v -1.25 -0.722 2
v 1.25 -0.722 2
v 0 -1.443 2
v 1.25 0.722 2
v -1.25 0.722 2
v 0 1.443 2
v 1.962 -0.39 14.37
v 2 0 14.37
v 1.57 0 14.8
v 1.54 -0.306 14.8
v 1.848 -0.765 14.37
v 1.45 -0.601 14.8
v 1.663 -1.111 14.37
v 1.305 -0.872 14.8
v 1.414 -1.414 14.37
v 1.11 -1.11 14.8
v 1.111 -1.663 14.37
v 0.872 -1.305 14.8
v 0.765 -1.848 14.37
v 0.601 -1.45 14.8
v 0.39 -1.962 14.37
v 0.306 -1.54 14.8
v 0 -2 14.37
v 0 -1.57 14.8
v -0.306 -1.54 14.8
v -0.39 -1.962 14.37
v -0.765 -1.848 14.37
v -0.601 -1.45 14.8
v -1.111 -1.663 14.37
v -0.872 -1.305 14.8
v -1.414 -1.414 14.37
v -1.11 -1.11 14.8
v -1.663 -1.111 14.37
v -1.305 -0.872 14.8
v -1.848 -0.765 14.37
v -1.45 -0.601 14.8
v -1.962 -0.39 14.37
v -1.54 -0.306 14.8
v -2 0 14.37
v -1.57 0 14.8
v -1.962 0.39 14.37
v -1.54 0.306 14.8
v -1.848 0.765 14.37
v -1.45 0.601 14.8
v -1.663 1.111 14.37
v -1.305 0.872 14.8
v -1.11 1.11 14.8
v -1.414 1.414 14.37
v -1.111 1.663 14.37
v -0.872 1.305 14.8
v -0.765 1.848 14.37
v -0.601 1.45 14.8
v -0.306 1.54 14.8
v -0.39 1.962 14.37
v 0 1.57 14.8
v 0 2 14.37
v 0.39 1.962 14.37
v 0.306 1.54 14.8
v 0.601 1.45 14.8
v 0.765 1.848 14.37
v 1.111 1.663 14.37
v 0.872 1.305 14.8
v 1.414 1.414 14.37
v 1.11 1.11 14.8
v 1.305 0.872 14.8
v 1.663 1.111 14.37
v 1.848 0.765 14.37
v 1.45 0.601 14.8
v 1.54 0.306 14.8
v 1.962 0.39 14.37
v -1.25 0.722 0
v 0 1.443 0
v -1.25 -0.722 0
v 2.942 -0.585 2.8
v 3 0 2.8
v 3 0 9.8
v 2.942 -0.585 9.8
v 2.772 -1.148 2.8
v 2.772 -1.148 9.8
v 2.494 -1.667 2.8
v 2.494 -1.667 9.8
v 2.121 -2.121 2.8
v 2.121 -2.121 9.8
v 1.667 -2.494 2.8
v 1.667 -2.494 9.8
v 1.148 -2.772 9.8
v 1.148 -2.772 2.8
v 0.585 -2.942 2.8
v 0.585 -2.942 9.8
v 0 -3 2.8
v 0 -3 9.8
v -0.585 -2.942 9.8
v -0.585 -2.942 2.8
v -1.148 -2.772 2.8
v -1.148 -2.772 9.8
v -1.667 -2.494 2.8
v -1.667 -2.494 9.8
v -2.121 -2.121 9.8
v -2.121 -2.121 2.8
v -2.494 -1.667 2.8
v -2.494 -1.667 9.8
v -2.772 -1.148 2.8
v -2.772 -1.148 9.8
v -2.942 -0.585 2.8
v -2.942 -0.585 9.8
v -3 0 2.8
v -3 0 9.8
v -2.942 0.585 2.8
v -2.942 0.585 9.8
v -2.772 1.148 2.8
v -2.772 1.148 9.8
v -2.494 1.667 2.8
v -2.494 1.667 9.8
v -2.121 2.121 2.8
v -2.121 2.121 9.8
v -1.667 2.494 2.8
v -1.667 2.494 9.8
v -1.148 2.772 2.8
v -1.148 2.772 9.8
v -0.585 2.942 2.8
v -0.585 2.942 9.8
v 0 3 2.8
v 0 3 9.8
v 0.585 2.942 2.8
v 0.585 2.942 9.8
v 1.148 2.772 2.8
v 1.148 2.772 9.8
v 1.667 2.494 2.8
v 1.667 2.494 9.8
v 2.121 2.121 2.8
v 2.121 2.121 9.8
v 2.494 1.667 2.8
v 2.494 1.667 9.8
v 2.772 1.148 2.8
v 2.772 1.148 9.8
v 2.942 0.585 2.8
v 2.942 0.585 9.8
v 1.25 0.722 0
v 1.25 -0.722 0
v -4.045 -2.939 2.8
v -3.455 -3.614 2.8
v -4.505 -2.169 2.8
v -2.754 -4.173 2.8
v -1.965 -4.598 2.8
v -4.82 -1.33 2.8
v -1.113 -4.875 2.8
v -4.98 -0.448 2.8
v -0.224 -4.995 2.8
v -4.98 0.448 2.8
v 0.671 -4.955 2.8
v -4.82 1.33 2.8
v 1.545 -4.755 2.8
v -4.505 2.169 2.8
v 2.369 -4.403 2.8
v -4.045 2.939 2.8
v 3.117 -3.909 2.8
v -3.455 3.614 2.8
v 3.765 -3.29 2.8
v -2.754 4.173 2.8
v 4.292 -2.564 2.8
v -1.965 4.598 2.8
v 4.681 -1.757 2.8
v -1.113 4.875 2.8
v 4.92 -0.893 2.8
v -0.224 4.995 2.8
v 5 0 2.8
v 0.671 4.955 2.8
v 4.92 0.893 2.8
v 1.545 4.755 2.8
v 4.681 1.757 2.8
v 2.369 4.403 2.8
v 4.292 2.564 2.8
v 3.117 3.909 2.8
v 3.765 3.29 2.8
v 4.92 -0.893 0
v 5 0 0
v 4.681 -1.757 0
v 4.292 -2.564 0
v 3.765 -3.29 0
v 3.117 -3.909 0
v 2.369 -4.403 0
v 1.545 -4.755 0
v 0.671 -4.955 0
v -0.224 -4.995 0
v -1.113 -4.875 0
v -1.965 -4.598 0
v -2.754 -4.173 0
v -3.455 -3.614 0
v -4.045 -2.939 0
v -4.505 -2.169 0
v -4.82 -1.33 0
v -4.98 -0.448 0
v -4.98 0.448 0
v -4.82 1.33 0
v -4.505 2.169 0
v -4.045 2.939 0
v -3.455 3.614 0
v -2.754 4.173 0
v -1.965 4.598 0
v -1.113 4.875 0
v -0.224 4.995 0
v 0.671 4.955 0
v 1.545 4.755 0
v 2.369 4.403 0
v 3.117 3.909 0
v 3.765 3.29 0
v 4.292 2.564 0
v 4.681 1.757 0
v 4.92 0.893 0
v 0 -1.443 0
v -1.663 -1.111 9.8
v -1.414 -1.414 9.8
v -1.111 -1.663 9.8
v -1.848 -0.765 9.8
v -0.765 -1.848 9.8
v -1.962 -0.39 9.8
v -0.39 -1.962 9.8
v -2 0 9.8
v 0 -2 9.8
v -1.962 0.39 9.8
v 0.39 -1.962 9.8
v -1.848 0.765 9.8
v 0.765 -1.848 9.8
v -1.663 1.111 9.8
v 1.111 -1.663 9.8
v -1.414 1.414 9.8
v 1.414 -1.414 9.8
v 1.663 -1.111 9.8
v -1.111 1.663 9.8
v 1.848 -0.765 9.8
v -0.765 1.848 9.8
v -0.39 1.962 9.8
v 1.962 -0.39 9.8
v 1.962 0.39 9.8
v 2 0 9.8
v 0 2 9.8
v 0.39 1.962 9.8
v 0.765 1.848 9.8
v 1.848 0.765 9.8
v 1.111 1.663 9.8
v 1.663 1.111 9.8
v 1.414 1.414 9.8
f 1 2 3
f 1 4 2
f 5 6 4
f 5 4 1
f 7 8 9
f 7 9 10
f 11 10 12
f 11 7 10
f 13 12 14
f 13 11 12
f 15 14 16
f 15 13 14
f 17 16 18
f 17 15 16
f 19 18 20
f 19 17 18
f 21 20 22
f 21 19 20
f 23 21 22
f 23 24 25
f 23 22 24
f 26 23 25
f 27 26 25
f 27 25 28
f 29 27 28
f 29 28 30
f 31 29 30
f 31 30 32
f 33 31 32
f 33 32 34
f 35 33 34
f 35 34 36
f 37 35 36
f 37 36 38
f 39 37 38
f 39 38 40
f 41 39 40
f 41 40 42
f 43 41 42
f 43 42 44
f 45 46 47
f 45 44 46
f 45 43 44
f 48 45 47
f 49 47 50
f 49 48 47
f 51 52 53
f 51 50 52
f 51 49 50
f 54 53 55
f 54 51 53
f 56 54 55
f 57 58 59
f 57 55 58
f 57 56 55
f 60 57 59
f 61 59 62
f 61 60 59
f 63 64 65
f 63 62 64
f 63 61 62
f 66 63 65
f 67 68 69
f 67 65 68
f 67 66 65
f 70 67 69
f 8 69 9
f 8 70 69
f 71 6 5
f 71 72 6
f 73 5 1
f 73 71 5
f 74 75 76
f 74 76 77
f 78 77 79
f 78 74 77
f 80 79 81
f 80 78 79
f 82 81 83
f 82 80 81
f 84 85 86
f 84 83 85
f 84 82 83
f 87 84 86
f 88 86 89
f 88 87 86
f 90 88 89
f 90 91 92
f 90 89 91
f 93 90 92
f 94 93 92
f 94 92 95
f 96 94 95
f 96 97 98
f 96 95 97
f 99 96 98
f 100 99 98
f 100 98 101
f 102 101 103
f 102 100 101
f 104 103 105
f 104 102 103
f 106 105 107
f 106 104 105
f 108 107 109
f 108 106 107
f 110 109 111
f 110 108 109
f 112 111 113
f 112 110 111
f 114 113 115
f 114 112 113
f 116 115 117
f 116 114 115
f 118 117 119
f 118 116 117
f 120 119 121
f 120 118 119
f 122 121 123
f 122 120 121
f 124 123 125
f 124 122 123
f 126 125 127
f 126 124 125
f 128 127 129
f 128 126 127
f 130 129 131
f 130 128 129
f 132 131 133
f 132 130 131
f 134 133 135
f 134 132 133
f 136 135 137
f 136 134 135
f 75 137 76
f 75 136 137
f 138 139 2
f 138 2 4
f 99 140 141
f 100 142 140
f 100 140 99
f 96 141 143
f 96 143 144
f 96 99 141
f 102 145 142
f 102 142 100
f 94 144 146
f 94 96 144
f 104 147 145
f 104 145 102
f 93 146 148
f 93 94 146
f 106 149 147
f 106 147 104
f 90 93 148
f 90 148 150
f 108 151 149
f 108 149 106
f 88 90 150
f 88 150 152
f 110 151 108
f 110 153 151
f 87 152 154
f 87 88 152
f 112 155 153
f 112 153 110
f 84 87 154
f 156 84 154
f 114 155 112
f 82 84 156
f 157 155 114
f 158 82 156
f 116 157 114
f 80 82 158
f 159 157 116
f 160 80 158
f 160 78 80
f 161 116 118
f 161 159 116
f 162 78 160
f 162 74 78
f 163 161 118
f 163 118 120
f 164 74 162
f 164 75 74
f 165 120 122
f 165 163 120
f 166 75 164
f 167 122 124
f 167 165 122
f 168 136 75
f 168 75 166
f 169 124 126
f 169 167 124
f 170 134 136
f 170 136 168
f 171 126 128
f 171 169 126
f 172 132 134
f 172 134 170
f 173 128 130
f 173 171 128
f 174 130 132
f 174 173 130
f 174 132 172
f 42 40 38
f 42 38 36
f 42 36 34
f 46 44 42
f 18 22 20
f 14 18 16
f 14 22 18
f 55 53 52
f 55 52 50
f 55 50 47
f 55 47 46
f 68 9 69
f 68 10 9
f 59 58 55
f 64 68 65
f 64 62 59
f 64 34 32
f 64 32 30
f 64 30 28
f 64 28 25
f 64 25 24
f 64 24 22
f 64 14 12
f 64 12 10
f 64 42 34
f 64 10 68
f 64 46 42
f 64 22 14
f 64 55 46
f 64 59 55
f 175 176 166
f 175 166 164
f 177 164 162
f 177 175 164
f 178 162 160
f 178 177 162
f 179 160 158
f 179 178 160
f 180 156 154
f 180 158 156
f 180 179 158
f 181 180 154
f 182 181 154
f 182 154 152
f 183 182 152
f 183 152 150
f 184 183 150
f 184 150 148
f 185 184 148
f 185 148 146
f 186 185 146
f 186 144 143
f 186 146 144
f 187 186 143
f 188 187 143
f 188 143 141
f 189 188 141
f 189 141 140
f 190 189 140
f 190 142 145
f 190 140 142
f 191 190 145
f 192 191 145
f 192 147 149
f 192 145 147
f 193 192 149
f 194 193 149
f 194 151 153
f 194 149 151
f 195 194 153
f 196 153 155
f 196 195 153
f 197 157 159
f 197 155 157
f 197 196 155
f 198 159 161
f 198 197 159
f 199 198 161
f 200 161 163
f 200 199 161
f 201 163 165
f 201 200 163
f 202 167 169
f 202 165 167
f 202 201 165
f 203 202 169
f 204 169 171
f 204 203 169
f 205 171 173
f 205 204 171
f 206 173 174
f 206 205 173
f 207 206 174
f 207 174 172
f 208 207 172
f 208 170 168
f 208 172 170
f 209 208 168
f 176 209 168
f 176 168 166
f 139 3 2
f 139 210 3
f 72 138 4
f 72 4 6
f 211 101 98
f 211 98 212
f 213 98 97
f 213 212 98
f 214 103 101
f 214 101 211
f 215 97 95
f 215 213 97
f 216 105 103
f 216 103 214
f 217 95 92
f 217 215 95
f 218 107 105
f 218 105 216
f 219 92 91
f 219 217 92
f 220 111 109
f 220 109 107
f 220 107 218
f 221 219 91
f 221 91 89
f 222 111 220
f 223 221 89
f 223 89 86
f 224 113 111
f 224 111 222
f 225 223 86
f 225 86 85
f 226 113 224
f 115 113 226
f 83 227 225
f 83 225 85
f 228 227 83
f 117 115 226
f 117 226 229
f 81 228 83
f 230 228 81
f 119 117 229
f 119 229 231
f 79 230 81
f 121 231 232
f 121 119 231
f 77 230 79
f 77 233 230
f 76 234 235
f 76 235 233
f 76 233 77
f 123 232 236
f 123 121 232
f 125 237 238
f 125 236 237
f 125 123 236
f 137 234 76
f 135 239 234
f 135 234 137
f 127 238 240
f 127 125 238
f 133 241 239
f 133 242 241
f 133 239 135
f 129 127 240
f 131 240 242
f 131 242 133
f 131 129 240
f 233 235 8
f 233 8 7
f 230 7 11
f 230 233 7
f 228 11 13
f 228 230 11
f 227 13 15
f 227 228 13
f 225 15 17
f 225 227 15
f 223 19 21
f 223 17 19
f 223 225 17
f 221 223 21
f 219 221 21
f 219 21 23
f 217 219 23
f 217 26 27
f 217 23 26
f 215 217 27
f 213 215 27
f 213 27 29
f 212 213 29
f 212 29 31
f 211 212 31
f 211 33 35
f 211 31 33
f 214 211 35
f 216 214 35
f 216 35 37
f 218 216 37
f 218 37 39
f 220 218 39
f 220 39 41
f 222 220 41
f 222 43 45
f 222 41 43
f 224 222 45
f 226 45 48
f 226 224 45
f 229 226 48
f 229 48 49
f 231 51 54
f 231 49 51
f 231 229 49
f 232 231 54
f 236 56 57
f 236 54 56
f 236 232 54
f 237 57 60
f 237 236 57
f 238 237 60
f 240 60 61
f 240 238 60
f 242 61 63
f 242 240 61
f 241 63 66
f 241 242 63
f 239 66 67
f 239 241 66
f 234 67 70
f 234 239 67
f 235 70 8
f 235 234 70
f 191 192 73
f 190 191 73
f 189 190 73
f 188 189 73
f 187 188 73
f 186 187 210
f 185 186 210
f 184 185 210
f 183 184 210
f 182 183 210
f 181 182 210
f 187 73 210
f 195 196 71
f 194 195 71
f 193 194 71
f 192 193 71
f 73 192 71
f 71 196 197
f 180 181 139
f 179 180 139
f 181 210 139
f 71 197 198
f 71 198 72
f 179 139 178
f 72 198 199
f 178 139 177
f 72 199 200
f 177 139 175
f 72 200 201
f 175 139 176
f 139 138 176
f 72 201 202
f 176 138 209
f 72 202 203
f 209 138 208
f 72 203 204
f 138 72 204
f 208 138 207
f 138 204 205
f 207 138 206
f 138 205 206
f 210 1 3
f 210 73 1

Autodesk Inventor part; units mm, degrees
ref_plane "YZ Plane" through (0, 0, 0) normal (1, 0, 0) x (0, 1, 0)
ref_plane "XZ Plane" through (0, 0, 0) normal (0, 1, 0) x (-1, 0, 0)
ref_plane "XY Plane" through (0, 0, 0) normal (0, 0, 1) x (1, 0, 0)
sketch "Sketch1" plane through (0, 0, 0) normal (0, 1, 0) x (-1, 0, 0)
  line L0 (0, 0) -> (0, 14.8)
  line L1 (0, 14.8) -> (-2, 14.8)
  line L2 (-2, 14.8) -> (-2, 9.8)
  line L3 (-2, 9.8) -> (-3, 9.8)
  line L4 (-3, 9.8) -> (-3, 2.8)
  line L5 (-3, 2.8) -> (-5, 2.8)
  line L6 (-5, 2.8) -> (-5, 0)
  line L7 (-5, 0) -> (0, 0)
  dimension "d0" = 10
  dimension "d1" = 6
  dimension "d2" = 4
  dimension "d3" = 5
  dimension "d4" = 7
  dimension "d5" = 2.8
revolve "Revolution1" add sketch "Sketch1" angle 360 about axis through (0, 0, 0) along (0, 0, 1)
thread "Thread1" size "M4x0.7" class "6g" standard "ANSI Metric M Profile" length 6 offset 1.2
sketch "Sketch2" plane through (0, 0, 0) normal (0, 0, -1) x (-1, 0, 0)
  line L0 (0, 1.4434) -> (1.25, 0.7217)
  line L1 (1.25, 0.7217) -> (1.25, -0.7217)
  line L2 (1.25, -0.7217) -> (0, -1.4434)
  line L3 (0, -1.4434) -> (-1.25, -0.7217)
  line L4 (-1.25, -0.7217) -> (-1.25, 0.7217)
  line L5 (-1.25, 0.7217) -> (0, 1.4434)
  point P0 (0, 0)
  point P1 (0, 0)
  dimension "d9" = 2.5
extrude "Extrusion1" cut sketch "Sketch2" against normal blind 2
chamfer "Chamfer1" distance 0.43 angle 45 1 edges at (-2, 0, 14.8)
properties part number "DBSY4-7-5" material "Stainless Steel AISI 304"
